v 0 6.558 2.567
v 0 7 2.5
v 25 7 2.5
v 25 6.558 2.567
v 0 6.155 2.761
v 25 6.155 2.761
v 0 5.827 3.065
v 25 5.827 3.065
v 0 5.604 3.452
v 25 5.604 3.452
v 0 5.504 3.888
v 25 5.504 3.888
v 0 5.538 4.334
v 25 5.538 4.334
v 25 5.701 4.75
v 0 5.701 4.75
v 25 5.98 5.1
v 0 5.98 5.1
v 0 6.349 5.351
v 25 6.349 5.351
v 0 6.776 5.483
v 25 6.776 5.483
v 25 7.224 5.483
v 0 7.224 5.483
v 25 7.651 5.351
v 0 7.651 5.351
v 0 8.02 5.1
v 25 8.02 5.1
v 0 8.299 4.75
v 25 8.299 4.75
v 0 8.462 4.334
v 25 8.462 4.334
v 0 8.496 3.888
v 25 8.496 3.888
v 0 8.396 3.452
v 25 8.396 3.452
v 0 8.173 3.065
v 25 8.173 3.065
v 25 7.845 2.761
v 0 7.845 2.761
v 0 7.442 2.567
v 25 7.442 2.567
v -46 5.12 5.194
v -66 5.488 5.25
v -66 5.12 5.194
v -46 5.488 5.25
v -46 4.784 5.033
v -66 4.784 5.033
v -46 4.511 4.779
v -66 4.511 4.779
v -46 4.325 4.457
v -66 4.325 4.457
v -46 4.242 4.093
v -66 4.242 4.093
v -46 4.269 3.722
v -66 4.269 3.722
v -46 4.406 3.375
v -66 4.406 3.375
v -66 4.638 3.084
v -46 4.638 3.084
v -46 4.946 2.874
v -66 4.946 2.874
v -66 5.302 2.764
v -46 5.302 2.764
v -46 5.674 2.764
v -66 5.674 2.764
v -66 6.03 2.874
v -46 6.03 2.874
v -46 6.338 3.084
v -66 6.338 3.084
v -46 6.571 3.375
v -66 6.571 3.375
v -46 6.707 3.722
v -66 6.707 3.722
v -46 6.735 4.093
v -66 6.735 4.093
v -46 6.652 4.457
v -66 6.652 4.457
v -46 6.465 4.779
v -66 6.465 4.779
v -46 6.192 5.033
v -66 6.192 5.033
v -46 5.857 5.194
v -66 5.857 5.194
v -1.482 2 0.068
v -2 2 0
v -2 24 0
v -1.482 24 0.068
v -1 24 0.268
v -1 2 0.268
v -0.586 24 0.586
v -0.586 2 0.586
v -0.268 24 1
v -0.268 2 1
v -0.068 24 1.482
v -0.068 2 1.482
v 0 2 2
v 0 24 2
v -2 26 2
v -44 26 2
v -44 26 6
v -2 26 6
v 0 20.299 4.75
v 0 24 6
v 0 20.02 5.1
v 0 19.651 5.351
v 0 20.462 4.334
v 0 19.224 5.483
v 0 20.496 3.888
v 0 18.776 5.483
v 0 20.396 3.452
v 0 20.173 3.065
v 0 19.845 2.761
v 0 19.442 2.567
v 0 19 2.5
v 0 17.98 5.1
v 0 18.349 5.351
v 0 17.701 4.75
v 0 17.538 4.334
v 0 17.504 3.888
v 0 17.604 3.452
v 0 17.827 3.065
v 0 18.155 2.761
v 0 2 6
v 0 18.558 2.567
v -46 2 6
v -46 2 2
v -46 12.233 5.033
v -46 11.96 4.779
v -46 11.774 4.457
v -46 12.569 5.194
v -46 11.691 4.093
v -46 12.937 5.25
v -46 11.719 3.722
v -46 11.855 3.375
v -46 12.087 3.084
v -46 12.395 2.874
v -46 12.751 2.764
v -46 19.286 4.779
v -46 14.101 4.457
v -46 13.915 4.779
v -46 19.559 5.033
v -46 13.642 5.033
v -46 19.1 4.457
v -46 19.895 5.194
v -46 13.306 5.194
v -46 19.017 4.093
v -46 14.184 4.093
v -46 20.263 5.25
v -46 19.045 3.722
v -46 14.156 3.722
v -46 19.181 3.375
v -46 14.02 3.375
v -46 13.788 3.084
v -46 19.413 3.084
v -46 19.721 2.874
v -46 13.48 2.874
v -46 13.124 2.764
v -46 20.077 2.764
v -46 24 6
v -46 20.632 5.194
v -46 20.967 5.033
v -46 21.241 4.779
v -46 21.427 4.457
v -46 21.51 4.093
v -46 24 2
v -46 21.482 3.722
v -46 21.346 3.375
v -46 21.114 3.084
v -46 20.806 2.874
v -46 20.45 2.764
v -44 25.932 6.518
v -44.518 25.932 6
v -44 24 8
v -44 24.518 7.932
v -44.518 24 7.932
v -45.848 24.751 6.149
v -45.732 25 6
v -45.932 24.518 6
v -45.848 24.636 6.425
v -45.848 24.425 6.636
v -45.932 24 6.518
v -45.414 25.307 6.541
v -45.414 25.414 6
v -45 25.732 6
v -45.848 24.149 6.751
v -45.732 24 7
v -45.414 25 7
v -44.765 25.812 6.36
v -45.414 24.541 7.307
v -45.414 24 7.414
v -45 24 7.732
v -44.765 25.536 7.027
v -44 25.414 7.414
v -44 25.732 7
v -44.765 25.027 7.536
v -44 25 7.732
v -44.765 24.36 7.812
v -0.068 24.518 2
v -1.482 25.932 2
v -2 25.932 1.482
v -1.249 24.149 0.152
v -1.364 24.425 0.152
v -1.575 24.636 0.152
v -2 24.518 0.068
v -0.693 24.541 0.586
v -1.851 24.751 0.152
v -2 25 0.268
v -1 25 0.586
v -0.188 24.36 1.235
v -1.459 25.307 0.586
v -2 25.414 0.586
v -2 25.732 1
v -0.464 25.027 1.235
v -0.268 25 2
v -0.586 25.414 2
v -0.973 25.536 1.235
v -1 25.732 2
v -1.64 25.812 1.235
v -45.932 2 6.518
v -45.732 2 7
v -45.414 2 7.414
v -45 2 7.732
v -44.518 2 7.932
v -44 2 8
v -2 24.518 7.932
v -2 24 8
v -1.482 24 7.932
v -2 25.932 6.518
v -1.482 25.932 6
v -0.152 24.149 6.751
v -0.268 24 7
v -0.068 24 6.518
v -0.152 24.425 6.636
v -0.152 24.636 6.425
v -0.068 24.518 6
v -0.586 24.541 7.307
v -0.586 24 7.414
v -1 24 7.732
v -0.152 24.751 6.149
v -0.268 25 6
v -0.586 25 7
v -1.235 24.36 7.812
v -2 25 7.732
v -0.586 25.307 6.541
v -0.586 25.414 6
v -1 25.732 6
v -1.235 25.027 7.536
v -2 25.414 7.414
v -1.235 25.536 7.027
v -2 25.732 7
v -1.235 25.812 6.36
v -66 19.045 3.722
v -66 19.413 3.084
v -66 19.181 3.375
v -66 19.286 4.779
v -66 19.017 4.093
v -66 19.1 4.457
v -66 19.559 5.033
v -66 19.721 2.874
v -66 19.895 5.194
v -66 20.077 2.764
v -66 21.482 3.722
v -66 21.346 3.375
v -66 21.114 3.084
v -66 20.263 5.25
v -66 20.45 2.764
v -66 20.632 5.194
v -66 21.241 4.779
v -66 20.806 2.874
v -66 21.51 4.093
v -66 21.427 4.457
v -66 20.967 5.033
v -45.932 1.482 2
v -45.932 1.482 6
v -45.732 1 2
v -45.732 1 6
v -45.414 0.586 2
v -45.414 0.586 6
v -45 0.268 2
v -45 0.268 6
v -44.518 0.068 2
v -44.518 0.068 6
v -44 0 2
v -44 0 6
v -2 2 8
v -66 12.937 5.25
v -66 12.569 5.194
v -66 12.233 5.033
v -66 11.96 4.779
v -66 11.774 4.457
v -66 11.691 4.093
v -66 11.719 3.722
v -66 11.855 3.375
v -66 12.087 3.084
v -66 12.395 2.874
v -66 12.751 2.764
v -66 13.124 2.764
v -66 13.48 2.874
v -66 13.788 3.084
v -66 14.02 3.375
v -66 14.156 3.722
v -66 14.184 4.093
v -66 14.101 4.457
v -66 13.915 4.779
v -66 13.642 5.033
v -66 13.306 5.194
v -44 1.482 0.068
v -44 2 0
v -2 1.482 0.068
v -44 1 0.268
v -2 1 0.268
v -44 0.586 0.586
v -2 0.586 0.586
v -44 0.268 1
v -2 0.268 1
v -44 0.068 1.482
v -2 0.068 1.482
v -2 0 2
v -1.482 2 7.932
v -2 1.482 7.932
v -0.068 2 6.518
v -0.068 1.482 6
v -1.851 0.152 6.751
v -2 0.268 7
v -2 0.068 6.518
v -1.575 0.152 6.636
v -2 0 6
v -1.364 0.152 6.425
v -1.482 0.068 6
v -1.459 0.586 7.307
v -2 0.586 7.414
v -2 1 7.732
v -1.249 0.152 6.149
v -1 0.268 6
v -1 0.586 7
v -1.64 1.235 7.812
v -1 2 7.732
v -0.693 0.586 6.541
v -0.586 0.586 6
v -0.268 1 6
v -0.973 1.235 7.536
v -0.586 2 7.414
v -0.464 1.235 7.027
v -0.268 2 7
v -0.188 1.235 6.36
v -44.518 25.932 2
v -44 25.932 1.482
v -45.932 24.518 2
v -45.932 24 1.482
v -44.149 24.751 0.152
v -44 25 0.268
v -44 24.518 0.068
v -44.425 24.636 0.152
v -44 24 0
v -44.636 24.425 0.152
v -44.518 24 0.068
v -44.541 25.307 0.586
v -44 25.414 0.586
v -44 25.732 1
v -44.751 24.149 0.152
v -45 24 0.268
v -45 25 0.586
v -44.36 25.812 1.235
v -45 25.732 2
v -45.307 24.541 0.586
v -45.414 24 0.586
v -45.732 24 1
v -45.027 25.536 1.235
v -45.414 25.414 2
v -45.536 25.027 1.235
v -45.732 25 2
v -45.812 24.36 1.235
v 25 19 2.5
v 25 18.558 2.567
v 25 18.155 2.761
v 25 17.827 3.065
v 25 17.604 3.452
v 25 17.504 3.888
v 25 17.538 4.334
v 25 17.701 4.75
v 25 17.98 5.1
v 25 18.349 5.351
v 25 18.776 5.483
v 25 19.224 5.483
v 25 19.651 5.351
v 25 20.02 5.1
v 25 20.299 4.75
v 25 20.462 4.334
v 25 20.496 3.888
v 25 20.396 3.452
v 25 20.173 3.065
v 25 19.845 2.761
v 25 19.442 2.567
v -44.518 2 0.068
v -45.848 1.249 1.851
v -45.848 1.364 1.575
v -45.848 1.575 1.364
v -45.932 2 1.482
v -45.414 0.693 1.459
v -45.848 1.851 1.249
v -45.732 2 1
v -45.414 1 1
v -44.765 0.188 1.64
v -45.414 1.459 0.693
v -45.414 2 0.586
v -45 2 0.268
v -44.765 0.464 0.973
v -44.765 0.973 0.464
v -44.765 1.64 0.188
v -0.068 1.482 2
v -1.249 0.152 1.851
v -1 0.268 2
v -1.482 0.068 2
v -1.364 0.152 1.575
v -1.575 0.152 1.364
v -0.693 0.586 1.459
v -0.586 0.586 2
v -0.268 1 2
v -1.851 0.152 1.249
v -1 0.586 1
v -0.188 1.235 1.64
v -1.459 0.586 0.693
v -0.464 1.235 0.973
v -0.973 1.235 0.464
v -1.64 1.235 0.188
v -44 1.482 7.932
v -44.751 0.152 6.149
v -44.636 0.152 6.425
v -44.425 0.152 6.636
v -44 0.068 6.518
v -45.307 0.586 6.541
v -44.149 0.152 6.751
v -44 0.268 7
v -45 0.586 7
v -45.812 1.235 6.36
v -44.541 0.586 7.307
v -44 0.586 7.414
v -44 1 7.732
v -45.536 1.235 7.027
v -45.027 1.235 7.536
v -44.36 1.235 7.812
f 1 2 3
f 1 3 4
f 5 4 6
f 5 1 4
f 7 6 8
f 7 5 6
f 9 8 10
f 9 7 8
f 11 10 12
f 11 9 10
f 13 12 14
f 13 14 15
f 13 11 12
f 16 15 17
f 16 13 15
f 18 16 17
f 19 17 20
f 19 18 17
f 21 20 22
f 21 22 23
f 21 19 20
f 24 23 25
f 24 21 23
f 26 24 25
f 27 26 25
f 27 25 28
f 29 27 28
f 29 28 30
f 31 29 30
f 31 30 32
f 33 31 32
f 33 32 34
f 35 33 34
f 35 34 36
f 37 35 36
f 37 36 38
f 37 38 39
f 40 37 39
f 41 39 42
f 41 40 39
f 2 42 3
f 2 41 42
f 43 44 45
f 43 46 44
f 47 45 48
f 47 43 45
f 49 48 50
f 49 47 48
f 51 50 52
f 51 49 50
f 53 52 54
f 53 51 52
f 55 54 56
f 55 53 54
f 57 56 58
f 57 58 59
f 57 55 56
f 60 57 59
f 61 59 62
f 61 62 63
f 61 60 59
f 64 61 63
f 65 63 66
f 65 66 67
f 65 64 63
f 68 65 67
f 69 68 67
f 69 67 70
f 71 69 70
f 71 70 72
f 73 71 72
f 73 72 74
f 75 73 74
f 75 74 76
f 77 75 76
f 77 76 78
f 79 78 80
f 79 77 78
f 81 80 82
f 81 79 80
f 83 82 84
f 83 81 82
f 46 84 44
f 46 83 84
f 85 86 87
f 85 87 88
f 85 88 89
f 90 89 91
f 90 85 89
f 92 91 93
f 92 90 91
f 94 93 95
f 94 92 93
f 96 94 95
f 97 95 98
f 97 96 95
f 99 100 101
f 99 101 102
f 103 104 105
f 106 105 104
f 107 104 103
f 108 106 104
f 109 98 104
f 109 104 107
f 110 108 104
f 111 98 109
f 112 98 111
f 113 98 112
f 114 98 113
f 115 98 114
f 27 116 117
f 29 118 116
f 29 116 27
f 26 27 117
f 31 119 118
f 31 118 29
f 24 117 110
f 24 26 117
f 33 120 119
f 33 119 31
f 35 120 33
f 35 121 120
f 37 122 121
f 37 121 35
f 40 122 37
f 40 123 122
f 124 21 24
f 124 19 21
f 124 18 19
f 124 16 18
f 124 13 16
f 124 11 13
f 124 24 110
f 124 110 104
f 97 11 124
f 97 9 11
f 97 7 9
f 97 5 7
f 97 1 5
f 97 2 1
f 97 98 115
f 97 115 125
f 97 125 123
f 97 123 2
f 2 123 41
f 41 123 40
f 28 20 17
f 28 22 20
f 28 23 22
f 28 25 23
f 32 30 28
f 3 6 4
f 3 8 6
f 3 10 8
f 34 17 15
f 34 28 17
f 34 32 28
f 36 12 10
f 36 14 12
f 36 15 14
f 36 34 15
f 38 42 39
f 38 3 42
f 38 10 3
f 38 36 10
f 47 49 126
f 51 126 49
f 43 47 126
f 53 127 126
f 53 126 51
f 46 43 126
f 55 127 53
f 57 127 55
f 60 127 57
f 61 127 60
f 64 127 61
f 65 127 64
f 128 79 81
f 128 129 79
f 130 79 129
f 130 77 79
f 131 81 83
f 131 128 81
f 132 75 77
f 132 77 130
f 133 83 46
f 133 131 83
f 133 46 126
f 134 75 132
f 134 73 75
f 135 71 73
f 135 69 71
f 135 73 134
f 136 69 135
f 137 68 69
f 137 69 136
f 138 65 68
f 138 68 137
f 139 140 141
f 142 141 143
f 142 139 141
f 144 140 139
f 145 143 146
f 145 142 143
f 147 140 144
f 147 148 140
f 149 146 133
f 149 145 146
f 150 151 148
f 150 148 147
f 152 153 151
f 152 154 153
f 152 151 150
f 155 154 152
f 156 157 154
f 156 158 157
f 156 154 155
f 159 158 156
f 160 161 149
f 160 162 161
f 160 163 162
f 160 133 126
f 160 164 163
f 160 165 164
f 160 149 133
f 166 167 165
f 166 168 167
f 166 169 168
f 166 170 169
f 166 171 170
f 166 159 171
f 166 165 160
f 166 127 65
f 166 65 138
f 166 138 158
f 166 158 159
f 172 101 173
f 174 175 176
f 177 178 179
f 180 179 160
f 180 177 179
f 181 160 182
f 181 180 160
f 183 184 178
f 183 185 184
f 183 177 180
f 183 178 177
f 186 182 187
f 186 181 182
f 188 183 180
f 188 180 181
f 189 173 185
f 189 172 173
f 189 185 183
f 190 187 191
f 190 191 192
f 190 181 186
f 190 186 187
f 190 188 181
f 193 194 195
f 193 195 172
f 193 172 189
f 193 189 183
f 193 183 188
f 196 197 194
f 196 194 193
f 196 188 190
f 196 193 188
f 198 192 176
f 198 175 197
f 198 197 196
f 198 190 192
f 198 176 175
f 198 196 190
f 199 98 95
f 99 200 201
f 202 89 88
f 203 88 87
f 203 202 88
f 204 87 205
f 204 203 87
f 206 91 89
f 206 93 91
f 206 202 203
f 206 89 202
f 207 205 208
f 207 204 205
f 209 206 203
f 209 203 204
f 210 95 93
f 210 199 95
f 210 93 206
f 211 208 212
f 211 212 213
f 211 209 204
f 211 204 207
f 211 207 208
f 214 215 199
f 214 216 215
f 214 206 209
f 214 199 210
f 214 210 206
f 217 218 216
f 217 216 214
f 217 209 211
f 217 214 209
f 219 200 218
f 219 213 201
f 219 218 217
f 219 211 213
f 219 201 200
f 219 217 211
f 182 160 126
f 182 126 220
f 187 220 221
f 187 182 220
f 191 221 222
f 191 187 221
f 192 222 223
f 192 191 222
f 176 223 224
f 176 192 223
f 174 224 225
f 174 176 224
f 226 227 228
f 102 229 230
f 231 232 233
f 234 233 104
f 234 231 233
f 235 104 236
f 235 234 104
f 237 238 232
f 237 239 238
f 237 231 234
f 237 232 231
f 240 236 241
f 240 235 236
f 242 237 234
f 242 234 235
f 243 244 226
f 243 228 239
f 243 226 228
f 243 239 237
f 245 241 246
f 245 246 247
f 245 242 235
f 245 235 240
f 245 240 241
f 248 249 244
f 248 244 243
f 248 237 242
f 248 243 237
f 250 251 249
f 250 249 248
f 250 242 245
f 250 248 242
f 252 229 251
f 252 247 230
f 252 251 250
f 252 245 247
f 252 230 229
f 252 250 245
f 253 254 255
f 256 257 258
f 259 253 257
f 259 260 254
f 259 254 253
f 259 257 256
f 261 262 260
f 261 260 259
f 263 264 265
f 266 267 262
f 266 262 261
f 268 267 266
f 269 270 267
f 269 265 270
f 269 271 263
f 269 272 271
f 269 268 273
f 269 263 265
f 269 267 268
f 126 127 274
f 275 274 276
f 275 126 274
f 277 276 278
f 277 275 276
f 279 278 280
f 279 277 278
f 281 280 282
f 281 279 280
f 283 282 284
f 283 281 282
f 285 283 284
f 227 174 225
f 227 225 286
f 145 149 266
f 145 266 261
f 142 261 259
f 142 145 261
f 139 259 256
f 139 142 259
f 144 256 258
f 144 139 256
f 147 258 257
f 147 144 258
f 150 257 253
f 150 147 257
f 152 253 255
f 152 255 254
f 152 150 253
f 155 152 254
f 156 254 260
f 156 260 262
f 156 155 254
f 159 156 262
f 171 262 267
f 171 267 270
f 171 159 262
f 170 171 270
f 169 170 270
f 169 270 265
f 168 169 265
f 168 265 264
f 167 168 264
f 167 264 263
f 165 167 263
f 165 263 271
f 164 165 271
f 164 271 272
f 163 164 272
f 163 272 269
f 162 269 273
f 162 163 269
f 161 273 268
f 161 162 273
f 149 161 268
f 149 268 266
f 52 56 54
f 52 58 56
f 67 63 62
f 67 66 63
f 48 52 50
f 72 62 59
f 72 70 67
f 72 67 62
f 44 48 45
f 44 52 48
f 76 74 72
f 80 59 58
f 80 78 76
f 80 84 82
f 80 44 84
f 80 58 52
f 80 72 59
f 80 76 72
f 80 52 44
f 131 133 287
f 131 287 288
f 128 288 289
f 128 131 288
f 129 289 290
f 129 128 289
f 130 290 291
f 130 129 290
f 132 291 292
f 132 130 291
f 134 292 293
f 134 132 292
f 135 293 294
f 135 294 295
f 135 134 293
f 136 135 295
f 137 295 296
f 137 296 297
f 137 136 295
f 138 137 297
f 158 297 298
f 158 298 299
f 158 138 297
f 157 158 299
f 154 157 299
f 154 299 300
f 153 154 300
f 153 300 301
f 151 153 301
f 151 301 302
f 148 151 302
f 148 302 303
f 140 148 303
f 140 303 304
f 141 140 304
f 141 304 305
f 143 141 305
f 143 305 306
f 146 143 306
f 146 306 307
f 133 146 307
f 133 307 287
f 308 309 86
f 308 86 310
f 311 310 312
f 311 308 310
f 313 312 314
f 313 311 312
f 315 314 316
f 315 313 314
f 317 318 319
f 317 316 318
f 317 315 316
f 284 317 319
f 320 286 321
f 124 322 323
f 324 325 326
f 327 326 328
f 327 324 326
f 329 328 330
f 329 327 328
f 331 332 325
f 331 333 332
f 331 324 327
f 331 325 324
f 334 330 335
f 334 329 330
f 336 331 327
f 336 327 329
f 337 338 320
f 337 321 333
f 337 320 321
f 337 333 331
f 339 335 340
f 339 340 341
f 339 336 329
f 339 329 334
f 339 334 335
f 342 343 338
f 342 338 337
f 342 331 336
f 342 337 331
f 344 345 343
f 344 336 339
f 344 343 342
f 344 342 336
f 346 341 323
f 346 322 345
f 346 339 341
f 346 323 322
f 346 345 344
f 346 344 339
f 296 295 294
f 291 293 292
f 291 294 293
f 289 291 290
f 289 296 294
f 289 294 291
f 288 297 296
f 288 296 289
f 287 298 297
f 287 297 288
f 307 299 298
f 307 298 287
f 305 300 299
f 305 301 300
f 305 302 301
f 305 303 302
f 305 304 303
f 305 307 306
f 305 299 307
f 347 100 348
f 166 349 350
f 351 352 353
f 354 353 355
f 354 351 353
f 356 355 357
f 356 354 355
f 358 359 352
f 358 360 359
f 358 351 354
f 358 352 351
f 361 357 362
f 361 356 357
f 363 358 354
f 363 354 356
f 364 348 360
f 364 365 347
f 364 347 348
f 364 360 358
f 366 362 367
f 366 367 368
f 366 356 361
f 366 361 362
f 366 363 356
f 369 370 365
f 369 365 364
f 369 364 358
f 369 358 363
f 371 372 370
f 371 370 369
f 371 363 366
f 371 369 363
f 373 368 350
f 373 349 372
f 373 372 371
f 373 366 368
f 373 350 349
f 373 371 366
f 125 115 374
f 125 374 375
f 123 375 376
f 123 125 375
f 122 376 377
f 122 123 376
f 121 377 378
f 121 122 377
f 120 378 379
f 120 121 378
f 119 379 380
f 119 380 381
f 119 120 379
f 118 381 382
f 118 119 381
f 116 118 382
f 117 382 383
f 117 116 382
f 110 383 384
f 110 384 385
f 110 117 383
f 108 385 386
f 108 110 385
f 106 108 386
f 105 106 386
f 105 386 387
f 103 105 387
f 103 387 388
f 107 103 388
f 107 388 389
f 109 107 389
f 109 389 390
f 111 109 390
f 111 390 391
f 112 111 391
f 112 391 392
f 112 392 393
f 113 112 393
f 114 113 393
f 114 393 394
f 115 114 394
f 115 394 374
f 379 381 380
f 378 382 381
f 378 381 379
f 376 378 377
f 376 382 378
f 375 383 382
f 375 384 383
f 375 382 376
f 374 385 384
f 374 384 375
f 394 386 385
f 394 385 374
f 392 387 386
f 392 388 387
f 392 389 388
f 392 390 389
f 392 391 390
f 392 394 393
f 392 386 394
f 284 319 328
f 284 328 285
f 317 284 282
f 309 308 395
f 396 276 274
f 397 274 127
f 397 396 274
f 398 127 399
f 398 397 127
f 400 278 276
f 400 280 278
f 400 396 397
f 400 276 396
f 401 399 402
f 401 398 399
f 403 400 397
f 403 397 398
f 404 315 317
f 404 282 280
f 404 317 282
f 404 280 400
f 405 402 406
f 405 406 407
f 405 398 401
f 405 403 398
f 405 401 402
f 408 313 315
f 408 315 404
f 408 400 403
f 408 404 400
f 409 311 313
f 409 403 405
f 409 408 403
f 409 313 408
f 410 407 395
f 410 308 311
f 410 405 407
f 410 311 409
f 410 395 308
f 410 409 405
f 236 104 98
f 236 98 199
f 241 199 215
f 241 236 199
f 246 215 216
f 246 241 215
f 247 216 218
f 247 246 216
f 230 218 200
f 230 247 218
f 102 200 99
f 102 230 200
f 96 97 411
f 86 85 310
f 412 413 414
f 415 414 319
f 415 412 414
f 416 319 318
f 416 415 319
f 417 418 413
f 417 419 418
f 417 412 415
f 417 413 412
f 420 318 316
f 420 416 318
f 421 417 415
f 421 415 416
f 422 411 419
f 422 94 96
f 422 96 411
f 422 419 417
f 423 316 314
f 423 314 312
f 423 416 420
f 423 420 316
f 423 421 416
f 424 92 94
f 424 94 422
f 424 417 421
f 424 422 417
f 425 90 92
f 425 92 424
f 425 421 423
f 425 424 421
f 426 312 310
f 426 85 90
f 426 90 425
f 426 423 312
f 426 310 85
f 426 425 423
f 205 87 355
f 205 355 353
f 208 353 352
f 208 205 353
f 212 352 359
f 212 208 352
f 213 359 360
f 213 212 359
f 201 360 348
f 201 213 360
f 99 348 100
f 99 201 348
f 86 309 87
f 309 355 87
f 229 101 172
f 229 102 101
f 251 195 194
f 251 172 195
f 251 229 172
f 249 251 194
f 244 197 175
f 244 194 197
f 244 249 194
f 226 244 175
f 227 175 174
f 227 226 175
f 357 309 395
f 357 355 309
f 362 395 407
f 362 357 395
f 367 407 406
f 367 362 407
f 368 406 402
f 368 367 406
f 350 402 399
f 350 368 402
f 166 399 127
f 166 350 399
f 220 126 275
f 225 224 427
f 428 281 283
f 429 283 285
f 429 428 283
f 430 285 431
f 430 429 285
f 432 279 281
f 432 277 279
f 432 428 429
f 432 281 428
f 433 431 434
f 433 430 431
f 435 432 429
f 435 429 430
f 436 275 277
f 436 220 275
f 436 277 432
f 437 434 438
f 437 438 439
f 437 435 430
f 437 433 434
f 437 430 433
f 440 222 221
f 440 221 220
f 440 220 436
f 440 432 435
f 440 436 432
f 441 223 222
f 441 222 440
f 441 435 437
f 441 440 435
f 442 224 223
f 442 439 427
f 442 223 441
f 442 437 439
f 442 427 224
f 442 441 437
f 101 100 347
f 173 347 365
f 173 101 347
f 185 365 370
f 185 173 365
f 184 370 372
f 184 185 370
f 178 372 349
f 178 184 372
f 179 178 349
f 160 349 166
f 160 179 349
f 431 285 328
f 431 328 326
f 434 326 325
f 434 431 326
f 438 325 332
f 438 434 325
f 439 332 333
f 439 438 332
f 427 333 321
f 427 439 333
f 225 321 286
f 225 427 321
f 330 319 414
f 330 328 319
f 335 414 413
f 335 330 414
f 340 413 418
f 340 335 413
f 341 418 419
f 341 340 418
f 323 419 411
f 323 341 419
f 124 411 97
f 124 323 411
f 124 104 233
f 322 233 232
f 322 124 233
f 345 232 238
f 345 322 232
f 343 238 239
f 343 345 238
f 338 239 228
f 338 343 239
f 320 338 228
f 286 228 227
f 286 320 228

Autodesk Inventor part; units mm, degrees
ref_plane "YZ Plane" through (0, 0, 0) normal (1, 0, 0) x (0, 1, 0)
ref_plane "XZ Plane" through (0, 0, 0) normal (0, 1, 0) x (-1, 0, 0)
ref_plane "XY Plane" through (0, 0, 0) normal (0, 0, 1) x (1, 0, 0)
sketch "Sketch1" plane through (0, 0, 0) normal (0, 0, 1) x (1, 0, 0)
  line L0 (0, 0) -> (-46, 0)
  line L1 (-46, 0) -> (-46, 26)
  line L2 (-46, 26) -> (0, 26)
  line L3 (0, 26) -> (0, 0)
  dimension "d0" = 46
  dimension "d1" = 26
extrude "Extrusion1" add sketch "Sketch1" along normal blind 8
fillet "Fillet1" radius 2 12 edges at (-23, 26, 8) (-46, 13, 8) (-46, 26, 4) (0, 13, 8) (-23, 0, 8) (0, 26, 4) (0, 13, 0) (0, 0, 4) (-23, 0, 0) (-46, 0, 4) (-46, 13, 0) (-23, 26, 0)
sketch "Sketch2" plane through (0, 2, 6) normal (1, 0, 0) x (0, 0, -1)
  circle A0 centre (2, 17) radius 1.5
  line L0 (0, 0) -> (0, 22) projected
  line L1 (0, 22) -> (4, 22) projected
  line L2 (4, 22) -> (4, 0) projected
  line L3 (4, 0) -> (0, 0) projected
  circle A1 centre (2, 5) radius 1.5
  line L4 (2, 26.4217) -> (2, -4.8985)
  point P0 (6, -2)
  dimension "d5" = 3
  dimension "d6" = 3
  dimension "d7" = 5
  dimension "d8" = 5
extrude "Extrusion2" add sketch "Sketch2" along normal blind 25 contours A0 L4 | L4 A0 | L4 A1 | A1 L4
sketch "Sketch3" plane through (-46, 2, 2) normal (-1, 0, 0) x (0, 0, 1)
  line L0 (4, 22) -> (4, 0) projected
  line L1 (0, 22) -> (4, 22) projected
  line L2 (0, 22) -> (4, 22) projected
  line L3 (0, 0) -> (0, 22) projected
  line L4 (4, 0) -> (0, 0) projected
  line L5 (4, 22) -> (4, 0) projected
  circle A0 centre (2, 18.2633) radius 1.25
  circle A1 centre (2, 10.9374) radius 1.25
  circle A2 centre (2, 3.4881) radius 1.25
  line L6 (2, 27.5735) -> (2, -5.6987)
  point P0 (-2, -2)
  dimension "d11" = 2.5
  dimension "d12" = 2.5
  dimension "d13" = 2.5
extrude "Extrusion3" add sketch "Sketch3" along normal blind 20 contours L6 A0 | A0 L6 | L6 A2 | A2 L6 | L6 A1 | A1 L6
properties part number "Esc_BlHeli_30A"
